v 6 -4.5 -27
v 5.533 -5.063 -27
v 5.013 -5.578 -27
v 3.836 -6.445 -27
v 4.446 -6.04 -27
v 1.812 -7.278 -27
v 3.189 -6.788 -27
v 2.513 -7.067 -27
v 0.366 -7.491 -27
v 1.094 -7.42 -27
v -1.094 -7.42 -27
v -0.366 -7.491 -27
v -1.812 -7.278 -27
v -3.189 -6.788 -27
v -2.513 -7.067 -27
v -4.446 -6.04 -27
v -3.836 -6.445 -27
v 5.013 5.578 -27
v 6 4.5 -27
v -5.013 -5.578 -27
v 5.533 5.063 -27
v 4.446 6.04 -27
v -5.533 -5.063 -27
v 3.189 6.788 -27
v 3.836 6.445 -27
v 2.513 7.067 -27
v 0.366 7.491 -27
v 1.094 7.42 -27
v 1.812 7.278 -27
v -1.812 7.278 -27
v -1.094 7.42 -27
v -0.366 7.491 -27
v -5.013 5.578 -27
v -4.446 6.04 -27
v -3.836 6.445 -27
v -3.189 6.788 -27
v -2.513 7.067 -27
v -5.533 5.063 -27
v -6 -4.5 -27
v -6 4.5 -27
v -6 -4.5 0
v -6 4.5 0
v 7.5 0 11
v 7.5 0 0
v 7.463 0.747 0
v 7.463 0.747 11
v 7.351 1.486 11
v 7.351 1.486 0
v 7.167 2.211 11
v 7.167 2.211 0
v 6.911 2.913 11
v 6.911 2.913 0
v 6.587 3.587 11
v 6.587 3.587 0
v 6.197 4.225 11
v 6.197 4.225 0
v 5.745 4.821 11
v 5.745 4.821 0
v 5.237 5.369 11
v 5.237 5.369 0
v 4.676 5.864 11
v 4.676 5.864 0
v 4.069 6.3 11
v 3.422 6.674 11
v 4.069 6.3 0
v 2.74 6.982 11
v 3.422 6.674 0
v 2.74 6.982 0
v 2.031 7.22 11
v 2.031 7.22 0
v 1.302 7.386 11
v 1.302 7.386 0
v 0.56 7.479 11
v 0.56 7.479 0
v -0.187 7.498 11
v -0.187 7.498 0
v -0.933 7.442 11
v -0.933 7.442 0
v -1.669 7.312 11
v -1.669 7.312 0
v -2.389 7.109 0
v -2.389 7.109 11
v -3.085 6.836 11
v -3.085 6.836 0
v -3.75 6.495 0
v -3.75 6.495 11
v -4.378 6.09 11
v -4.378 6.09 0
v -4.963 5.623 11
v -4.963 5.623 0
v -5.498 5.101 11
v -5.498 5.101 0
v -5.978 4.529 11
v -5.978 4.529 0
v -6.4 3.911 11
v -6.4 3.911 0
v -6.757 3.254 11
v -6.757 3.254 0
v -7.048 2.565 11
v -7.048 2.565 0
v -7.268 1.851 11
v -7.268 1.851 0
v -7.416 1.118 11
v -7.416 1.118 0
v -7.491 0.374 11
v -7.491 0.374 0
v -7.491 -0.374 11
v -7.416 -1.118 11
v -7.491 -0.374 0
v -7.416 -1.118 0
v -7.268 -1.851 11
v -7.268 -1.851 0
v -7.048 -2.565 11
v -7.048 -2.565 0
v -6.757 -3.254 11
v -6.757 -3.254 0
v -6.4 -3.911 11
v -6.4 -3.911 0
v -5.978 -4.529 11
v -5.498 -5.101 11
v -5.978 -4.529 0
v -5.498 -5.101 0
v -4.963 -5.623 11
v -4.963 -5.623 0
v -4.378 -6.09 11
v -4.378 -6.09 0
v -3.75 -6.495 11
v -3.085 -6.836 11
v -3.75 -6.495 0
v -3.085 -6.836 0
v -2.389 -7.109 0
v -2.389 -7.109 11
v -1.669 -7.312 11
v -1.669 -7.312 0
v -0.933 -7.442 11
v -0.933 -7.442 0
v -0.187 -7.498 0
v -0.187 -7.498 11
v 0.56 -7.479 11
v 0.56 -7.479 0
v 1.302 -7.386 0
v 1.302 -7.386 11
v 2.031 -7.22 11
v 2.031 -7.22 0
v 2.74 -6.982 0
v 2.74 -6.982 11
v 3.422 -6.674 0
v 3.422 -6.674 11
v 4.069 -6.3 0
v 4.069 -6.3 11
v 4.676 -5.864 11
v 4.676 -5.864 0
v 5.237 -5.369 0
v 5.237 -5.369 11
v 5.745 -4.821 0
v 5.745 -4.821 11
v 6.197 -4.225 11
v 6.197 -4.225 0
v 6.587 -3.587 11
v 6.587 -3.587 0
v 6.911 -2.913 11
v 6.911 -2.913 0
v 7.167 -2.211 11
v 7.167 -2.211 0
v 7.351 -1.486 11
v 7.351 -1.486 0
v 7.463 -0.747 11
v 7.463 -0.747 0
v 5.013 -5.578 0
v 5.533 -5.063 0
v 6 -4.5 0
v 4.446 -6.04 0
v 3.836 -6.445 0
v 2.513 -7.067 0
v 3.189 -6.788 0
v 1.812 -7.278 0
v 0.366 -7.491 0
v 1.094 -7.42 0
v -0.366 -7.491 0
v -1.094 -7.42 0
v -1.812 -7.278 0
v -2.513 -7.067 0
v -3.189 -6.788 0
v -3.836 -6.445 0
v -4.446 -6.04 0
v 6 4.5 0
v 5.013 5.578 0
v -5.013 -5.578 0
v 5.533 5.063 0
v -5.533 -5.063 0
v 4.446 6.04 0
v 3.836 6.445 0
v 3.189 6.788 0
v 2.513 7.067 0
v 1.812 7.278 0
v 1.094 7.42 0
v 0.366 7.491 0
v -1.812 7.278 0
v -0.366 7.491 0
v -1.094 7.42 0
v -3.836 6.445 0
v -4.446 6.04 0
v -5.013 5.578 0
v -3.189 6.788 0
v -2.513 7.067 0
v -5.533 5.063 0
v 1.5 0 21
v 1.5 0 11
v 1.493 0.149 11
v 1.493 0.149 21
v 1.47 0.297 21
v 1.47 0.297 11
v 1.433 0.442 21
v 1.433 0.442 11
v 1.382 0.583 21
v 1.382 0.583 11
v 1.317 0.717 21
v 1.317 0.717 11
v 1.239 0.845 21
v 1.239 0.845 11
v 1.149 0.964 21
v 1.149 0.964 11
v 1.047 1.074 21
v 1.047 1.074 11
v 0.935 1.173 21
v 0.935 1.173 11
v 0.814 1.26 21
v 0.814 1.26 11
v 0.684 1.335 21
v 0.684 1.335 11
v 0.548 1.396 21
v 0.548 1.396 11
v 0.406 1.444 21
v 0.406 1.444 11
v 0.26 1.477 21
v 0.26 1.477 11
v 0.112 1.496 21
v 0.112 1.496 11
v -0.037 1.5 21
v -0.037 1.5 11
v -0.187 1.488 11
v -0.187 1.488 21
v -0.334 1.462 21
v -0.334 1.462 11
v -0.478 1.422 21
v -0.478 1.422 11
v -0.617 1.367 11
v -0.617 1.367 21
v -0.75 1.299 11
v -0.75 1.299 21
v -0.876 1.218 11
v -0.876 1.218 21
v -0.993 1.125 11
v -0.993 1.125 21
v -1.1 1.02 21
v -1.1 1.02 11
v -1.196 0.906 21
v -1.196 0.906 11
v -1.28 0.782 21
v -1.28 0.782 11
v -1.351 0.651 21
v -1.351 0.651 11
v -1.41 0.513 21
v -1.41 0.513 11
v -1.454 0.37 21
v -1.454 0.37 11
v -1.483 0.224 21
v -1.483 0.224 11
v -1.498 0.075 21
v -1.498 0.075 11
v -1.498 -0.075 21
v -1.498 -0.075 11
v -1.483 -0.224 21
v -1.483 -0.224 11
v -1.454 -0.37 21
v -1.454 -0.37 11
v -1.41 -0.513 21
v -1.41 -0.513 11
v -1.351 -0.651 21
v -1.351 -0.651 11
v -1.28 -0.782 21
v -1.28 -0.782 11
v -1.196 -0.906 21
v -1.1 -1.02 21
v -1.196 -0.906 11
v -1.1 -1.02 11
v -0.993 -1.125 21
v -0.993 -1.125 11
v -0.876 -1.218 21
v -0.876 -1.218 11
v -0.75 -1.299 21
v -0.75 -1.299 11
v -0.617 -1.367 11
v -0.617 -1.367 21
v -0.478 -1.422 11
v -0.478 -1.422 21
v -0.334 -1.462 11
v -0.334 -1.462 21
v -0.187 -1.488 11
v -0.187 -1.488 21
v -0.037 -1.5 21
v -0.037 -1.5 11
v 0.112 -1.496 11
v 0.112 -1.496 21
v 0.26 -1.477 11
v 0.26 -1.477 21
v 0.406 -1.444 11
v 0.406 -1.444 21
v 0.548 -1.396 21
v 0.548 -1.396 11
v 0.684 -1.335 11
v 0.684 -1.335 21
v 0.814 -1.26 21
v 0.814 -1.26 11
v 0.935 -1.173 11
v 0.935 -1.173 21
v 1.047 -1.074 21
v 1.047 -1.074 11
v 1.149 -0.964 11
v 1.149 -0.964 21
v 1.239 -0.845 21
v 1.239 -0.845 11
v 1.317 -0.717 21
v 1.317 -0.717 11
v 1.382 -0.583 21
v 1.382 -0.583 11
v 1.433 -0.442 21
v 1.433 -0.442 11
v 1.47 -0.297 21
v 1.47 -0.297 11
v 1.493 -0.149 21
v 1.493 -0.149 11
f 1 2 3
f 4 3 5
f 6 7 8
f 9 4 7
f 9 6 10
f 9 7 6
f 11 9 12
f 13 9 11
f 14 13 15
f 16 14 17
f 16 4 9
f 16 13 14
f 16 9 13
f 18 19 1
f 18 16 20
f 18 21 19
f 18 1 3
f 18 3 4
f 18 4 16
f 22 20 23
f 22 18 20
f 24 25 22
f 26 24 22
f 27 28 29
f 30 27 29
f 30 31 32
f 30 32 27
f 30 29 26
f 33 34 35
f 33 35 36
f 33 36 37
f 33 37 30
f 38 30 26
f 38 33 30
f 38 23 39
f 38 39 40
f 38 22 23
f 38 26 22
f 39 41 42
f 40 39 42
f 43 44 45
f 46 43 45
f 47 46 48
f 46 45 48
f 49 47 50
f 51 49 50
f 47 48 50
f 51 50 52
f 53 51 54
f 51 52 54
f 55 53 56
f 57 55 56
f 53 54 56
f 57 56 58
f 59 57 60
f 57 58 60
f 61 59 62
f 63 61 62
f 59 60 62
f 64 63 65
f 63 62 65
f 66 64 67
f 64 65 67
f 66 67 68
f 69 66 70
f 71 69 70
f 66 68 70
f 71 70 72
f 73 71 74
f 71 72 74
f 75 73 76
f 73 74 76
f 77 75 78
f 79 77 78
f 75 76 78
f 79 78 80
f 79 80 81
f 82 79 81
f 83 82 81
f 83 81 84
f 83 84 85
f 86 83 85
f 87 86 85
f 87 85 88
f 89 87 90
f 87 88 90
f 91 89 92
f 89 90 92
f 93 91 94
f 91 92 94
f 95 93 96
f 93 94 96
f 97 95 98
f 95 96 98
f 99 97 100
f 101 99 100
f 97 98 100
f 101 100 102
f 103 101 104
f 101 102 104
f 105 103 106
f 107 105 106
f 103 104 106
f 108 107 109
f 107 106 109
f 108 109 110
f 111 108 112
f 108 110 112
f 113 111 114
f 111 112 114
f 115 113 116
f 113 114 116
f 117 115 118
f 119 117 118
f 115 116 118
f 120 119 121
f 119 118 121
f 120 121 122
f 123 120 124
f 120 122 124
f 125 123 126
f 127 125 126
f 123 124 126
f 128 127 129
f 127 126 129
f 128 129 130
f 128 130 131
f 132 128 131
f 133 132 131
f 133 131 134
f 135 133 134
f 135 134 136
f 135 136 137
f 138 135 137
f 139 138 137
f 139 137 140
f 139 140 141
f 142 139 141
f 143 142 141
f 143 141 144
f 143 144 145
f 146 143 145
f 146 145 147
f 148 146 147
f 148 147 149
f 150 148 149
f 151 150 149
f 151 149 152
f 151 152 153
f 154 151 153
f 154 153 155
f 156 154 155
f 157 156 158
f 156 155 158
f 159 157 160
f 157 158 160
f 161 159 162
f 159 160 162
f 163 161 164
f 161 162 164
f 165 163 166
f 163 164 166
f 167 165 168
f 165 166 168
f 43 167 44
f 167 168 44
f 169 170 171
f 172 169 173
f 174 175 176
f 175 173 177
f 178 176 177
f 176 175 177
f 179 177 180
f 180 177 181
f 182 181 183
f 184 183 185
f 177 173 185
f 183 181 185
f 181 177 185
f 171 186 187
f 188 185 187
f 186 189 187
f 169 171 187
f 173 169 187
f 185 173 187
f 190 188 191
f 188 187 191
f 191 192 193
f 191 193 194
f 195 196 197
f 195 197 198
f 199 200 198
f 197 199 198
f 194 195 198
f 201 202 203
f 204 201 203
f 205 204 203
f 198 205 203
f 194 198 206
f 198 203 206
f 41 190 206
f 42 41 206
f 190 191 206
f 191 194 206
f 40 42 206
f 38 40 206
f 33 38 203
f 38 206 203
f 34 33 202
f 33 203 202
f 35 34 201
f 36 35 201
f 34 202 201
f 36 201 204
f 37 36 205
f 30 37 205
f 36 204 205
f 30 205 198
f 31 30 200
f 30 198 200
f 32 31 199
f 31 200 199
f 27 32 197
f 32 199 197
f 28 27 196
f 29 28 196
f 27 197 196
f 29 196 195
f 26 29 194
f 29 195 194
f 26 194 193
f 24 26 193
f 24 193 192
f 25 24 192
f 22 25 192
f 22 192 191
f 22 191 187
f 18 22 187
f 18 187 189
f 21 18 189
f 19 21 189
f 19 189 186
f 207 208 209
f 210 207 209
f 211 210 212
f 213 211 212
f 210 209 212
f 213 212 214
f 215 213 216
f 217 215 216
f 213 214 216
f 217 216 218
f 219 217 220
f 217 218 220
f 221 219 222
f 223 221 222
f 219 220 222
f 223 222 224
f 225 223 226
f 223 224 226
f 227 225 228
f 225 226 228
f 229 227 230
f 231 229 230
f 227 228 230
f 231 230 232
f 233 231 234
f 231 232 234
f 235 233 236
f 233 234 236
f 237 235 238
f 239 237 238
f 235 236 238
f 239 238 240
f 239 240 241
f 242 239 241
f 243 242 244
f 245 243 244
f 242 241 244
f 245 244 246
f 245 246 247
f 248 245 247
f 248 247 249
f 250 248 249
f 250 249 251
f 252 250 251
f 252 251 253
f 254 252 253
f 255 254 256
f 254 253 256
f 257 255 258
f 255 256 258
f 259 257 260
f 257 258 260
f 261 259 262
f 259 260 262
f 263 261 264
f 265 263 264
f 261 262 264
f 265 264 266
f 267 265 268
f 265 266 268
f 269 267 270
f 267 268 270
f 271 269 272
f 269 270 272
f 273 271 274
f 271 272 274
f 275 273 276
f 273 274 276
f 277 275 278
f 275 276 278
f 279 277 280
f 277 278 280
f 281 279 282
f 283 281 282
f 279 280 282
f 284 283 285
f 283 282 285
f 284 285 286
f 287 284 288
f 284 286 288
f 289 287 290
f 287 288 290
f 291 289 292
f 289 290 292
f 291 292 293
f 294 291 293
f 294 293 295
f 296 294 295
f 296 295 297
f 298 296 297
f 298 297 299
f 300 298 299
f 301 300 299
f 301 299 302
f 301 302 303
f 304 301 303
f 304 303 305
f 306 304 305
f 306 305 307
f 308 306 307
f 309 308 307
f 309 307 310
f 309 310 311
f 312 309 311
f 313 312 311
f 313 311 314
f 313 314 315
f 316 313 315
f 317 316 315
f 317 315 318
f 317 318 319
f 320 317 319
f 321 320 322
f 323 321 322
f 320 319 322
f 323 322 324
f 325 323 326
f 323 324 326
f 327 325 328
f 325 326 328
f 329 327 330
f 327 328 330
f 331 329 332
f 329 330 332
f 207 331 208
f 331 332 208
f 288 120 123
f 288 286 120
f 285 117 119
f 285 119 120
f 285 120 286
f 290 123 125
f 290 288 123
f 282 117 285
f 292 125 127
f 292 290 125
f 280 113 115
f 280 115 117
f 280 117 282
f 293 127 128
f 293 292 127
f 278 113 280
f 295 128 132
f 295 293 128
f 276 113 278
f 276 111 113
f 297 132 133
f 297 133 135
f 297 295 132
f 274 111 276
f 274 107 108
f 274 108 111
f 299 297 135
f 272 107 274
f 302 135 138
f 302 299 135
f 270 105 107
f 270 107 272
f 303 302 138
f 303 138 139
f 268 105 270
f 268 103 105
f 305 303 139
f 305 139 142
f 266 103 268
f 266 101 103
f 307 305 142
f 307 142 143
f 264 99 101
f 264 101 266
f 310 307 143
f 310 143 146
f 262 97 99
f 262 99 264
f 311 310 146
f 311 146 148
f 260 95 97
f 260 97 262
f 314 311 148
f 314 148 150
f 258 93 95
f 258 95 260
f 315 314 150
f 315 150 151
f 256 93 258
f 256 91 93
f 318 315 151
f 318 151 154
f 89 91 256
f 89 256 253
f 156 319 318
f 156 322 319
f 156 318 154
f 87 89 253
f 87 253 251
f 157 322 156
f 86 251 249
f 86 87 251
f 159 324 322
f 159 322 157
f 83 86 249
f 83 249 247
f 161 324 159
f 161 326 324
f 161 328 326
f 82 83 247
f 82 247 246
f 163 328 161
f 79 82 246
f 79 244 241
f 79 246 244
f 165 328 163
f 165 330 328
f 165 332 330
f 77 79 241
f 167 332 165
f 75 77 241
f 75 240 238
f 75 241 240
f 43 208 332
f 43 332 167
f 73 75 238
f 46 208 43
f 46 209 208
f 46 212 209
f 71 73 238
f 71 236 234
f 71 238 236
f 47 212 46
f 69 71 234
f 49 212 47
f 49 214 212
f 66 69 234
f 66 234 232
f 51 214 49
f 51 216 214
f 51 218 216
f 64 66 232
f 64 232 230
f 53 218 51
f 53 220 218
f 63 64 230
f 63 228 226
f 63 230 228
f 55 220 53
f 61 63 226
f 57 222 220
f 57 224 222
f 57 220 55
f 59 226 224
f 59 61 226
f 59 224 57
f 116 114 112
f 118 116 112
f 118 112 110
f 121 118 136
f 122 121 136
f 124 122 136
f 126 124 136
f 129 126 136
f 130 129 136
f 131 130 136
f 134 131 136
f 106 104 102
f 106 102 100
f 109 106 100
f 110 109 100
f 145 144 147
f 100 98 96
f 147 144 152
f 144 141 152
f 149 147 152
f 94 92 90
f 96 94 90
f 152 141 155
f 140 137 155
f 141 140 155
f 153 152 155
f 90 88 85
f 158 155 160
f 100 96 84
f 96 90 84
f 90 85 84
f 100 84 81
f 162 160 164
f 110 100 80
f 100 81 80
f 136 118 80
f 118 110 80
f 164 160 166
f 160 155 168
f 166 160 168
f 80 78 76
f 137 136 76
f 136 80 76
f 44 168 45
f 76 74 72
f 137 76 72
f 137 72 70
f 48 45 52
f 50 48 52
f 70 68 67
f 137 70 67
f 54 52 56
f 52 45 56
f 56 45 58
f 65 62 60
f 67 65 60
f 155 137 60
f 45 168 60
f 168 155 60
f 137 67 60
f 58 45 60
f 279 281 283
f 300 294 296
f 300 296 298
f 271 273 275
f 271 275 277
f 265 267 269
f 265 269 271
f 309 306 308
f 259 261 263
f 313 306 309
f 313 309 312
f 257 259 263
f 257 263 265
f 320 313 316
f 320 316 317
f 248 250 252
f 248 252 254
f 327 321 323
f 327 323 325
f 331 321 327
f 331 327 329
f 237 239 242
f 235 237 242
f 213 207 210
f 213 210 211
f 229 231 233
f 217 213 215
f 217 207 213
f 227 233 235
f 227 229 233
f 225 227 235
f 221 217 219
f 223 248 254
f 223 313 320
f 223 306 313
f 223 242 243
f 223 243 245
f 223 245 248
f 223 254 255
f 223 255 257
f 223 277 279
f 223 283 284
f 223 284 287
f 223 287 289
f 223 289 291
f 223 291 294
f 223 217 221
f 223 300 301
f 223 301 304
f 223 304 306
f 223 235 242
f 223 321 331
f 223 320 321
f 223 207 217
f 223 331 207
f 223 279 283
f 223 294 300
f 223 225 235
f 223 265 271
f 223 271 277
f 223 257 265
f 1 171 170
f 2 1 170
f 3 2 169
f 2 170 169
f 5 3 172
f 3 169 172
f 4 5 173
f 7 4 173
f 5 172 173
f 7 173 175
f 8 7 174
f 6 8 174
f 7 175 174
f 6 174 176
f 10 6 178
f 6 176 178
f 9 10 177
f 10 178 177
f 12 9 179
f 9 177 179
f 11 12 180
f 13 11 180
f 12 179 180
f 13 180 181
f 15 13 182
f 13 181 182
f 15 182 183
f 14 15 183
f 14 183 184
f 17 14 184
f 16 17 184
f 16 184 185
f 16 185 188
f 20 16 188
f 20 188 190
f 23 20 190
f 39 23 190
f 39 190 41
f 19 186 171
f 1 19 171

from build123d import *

# Parameters (mm, degrees)
CROQUIS1_R              = 7.5
SALIENTE_EXTRUIR1_DEPTH = 11
CROQUIS2_R              = 1.5
SALIENTE_EXTRUIR2_DEPTH = 10
SALIENTE_EXTRUIR3_DEPTH = 27


with BuildPart() as part:
    # Croquis1 → Saliente-Extruir1 (new body)
    with BuildSketch(Plane.XY):
        Circle(CROQUIS1_R)
    extrude(amount=SALIENTE_EXTRUIR1_DEPTH)

    # Croquis2 → Saliente-Extruir2 (add)
    with BuildSketch(Plane.XY.offset(11)):
        Circle(CROQUIS2_R)
    extrude(amount=SALIENTE_EXTRUIR2_DEPTH)


with BuildPart() as body_2:
    # Croquis3 → Saliente-Extruir3 (new body)
    with BuildSketch(Plane(origin=(0, 0, 0), x_dir=(-1, 0, 0), z_dir=(0, 0, -1))):
        with BuildLine():
            Line((-6, 4.5), (-6, -4.5))
            ThreePointArc((-6, -4.5), (0, -7.5), (6, -4.5))
            Line((6, -4.5), (6, 4.5))
            ThreePointArc((6, 4.5), (0, 7.5), (-6, 4.5))
        make_face()
    extrude(amount=SALIENTE_EXTRUIR3_DEPTH)


solid = Compound([part.part, body_2.part])
